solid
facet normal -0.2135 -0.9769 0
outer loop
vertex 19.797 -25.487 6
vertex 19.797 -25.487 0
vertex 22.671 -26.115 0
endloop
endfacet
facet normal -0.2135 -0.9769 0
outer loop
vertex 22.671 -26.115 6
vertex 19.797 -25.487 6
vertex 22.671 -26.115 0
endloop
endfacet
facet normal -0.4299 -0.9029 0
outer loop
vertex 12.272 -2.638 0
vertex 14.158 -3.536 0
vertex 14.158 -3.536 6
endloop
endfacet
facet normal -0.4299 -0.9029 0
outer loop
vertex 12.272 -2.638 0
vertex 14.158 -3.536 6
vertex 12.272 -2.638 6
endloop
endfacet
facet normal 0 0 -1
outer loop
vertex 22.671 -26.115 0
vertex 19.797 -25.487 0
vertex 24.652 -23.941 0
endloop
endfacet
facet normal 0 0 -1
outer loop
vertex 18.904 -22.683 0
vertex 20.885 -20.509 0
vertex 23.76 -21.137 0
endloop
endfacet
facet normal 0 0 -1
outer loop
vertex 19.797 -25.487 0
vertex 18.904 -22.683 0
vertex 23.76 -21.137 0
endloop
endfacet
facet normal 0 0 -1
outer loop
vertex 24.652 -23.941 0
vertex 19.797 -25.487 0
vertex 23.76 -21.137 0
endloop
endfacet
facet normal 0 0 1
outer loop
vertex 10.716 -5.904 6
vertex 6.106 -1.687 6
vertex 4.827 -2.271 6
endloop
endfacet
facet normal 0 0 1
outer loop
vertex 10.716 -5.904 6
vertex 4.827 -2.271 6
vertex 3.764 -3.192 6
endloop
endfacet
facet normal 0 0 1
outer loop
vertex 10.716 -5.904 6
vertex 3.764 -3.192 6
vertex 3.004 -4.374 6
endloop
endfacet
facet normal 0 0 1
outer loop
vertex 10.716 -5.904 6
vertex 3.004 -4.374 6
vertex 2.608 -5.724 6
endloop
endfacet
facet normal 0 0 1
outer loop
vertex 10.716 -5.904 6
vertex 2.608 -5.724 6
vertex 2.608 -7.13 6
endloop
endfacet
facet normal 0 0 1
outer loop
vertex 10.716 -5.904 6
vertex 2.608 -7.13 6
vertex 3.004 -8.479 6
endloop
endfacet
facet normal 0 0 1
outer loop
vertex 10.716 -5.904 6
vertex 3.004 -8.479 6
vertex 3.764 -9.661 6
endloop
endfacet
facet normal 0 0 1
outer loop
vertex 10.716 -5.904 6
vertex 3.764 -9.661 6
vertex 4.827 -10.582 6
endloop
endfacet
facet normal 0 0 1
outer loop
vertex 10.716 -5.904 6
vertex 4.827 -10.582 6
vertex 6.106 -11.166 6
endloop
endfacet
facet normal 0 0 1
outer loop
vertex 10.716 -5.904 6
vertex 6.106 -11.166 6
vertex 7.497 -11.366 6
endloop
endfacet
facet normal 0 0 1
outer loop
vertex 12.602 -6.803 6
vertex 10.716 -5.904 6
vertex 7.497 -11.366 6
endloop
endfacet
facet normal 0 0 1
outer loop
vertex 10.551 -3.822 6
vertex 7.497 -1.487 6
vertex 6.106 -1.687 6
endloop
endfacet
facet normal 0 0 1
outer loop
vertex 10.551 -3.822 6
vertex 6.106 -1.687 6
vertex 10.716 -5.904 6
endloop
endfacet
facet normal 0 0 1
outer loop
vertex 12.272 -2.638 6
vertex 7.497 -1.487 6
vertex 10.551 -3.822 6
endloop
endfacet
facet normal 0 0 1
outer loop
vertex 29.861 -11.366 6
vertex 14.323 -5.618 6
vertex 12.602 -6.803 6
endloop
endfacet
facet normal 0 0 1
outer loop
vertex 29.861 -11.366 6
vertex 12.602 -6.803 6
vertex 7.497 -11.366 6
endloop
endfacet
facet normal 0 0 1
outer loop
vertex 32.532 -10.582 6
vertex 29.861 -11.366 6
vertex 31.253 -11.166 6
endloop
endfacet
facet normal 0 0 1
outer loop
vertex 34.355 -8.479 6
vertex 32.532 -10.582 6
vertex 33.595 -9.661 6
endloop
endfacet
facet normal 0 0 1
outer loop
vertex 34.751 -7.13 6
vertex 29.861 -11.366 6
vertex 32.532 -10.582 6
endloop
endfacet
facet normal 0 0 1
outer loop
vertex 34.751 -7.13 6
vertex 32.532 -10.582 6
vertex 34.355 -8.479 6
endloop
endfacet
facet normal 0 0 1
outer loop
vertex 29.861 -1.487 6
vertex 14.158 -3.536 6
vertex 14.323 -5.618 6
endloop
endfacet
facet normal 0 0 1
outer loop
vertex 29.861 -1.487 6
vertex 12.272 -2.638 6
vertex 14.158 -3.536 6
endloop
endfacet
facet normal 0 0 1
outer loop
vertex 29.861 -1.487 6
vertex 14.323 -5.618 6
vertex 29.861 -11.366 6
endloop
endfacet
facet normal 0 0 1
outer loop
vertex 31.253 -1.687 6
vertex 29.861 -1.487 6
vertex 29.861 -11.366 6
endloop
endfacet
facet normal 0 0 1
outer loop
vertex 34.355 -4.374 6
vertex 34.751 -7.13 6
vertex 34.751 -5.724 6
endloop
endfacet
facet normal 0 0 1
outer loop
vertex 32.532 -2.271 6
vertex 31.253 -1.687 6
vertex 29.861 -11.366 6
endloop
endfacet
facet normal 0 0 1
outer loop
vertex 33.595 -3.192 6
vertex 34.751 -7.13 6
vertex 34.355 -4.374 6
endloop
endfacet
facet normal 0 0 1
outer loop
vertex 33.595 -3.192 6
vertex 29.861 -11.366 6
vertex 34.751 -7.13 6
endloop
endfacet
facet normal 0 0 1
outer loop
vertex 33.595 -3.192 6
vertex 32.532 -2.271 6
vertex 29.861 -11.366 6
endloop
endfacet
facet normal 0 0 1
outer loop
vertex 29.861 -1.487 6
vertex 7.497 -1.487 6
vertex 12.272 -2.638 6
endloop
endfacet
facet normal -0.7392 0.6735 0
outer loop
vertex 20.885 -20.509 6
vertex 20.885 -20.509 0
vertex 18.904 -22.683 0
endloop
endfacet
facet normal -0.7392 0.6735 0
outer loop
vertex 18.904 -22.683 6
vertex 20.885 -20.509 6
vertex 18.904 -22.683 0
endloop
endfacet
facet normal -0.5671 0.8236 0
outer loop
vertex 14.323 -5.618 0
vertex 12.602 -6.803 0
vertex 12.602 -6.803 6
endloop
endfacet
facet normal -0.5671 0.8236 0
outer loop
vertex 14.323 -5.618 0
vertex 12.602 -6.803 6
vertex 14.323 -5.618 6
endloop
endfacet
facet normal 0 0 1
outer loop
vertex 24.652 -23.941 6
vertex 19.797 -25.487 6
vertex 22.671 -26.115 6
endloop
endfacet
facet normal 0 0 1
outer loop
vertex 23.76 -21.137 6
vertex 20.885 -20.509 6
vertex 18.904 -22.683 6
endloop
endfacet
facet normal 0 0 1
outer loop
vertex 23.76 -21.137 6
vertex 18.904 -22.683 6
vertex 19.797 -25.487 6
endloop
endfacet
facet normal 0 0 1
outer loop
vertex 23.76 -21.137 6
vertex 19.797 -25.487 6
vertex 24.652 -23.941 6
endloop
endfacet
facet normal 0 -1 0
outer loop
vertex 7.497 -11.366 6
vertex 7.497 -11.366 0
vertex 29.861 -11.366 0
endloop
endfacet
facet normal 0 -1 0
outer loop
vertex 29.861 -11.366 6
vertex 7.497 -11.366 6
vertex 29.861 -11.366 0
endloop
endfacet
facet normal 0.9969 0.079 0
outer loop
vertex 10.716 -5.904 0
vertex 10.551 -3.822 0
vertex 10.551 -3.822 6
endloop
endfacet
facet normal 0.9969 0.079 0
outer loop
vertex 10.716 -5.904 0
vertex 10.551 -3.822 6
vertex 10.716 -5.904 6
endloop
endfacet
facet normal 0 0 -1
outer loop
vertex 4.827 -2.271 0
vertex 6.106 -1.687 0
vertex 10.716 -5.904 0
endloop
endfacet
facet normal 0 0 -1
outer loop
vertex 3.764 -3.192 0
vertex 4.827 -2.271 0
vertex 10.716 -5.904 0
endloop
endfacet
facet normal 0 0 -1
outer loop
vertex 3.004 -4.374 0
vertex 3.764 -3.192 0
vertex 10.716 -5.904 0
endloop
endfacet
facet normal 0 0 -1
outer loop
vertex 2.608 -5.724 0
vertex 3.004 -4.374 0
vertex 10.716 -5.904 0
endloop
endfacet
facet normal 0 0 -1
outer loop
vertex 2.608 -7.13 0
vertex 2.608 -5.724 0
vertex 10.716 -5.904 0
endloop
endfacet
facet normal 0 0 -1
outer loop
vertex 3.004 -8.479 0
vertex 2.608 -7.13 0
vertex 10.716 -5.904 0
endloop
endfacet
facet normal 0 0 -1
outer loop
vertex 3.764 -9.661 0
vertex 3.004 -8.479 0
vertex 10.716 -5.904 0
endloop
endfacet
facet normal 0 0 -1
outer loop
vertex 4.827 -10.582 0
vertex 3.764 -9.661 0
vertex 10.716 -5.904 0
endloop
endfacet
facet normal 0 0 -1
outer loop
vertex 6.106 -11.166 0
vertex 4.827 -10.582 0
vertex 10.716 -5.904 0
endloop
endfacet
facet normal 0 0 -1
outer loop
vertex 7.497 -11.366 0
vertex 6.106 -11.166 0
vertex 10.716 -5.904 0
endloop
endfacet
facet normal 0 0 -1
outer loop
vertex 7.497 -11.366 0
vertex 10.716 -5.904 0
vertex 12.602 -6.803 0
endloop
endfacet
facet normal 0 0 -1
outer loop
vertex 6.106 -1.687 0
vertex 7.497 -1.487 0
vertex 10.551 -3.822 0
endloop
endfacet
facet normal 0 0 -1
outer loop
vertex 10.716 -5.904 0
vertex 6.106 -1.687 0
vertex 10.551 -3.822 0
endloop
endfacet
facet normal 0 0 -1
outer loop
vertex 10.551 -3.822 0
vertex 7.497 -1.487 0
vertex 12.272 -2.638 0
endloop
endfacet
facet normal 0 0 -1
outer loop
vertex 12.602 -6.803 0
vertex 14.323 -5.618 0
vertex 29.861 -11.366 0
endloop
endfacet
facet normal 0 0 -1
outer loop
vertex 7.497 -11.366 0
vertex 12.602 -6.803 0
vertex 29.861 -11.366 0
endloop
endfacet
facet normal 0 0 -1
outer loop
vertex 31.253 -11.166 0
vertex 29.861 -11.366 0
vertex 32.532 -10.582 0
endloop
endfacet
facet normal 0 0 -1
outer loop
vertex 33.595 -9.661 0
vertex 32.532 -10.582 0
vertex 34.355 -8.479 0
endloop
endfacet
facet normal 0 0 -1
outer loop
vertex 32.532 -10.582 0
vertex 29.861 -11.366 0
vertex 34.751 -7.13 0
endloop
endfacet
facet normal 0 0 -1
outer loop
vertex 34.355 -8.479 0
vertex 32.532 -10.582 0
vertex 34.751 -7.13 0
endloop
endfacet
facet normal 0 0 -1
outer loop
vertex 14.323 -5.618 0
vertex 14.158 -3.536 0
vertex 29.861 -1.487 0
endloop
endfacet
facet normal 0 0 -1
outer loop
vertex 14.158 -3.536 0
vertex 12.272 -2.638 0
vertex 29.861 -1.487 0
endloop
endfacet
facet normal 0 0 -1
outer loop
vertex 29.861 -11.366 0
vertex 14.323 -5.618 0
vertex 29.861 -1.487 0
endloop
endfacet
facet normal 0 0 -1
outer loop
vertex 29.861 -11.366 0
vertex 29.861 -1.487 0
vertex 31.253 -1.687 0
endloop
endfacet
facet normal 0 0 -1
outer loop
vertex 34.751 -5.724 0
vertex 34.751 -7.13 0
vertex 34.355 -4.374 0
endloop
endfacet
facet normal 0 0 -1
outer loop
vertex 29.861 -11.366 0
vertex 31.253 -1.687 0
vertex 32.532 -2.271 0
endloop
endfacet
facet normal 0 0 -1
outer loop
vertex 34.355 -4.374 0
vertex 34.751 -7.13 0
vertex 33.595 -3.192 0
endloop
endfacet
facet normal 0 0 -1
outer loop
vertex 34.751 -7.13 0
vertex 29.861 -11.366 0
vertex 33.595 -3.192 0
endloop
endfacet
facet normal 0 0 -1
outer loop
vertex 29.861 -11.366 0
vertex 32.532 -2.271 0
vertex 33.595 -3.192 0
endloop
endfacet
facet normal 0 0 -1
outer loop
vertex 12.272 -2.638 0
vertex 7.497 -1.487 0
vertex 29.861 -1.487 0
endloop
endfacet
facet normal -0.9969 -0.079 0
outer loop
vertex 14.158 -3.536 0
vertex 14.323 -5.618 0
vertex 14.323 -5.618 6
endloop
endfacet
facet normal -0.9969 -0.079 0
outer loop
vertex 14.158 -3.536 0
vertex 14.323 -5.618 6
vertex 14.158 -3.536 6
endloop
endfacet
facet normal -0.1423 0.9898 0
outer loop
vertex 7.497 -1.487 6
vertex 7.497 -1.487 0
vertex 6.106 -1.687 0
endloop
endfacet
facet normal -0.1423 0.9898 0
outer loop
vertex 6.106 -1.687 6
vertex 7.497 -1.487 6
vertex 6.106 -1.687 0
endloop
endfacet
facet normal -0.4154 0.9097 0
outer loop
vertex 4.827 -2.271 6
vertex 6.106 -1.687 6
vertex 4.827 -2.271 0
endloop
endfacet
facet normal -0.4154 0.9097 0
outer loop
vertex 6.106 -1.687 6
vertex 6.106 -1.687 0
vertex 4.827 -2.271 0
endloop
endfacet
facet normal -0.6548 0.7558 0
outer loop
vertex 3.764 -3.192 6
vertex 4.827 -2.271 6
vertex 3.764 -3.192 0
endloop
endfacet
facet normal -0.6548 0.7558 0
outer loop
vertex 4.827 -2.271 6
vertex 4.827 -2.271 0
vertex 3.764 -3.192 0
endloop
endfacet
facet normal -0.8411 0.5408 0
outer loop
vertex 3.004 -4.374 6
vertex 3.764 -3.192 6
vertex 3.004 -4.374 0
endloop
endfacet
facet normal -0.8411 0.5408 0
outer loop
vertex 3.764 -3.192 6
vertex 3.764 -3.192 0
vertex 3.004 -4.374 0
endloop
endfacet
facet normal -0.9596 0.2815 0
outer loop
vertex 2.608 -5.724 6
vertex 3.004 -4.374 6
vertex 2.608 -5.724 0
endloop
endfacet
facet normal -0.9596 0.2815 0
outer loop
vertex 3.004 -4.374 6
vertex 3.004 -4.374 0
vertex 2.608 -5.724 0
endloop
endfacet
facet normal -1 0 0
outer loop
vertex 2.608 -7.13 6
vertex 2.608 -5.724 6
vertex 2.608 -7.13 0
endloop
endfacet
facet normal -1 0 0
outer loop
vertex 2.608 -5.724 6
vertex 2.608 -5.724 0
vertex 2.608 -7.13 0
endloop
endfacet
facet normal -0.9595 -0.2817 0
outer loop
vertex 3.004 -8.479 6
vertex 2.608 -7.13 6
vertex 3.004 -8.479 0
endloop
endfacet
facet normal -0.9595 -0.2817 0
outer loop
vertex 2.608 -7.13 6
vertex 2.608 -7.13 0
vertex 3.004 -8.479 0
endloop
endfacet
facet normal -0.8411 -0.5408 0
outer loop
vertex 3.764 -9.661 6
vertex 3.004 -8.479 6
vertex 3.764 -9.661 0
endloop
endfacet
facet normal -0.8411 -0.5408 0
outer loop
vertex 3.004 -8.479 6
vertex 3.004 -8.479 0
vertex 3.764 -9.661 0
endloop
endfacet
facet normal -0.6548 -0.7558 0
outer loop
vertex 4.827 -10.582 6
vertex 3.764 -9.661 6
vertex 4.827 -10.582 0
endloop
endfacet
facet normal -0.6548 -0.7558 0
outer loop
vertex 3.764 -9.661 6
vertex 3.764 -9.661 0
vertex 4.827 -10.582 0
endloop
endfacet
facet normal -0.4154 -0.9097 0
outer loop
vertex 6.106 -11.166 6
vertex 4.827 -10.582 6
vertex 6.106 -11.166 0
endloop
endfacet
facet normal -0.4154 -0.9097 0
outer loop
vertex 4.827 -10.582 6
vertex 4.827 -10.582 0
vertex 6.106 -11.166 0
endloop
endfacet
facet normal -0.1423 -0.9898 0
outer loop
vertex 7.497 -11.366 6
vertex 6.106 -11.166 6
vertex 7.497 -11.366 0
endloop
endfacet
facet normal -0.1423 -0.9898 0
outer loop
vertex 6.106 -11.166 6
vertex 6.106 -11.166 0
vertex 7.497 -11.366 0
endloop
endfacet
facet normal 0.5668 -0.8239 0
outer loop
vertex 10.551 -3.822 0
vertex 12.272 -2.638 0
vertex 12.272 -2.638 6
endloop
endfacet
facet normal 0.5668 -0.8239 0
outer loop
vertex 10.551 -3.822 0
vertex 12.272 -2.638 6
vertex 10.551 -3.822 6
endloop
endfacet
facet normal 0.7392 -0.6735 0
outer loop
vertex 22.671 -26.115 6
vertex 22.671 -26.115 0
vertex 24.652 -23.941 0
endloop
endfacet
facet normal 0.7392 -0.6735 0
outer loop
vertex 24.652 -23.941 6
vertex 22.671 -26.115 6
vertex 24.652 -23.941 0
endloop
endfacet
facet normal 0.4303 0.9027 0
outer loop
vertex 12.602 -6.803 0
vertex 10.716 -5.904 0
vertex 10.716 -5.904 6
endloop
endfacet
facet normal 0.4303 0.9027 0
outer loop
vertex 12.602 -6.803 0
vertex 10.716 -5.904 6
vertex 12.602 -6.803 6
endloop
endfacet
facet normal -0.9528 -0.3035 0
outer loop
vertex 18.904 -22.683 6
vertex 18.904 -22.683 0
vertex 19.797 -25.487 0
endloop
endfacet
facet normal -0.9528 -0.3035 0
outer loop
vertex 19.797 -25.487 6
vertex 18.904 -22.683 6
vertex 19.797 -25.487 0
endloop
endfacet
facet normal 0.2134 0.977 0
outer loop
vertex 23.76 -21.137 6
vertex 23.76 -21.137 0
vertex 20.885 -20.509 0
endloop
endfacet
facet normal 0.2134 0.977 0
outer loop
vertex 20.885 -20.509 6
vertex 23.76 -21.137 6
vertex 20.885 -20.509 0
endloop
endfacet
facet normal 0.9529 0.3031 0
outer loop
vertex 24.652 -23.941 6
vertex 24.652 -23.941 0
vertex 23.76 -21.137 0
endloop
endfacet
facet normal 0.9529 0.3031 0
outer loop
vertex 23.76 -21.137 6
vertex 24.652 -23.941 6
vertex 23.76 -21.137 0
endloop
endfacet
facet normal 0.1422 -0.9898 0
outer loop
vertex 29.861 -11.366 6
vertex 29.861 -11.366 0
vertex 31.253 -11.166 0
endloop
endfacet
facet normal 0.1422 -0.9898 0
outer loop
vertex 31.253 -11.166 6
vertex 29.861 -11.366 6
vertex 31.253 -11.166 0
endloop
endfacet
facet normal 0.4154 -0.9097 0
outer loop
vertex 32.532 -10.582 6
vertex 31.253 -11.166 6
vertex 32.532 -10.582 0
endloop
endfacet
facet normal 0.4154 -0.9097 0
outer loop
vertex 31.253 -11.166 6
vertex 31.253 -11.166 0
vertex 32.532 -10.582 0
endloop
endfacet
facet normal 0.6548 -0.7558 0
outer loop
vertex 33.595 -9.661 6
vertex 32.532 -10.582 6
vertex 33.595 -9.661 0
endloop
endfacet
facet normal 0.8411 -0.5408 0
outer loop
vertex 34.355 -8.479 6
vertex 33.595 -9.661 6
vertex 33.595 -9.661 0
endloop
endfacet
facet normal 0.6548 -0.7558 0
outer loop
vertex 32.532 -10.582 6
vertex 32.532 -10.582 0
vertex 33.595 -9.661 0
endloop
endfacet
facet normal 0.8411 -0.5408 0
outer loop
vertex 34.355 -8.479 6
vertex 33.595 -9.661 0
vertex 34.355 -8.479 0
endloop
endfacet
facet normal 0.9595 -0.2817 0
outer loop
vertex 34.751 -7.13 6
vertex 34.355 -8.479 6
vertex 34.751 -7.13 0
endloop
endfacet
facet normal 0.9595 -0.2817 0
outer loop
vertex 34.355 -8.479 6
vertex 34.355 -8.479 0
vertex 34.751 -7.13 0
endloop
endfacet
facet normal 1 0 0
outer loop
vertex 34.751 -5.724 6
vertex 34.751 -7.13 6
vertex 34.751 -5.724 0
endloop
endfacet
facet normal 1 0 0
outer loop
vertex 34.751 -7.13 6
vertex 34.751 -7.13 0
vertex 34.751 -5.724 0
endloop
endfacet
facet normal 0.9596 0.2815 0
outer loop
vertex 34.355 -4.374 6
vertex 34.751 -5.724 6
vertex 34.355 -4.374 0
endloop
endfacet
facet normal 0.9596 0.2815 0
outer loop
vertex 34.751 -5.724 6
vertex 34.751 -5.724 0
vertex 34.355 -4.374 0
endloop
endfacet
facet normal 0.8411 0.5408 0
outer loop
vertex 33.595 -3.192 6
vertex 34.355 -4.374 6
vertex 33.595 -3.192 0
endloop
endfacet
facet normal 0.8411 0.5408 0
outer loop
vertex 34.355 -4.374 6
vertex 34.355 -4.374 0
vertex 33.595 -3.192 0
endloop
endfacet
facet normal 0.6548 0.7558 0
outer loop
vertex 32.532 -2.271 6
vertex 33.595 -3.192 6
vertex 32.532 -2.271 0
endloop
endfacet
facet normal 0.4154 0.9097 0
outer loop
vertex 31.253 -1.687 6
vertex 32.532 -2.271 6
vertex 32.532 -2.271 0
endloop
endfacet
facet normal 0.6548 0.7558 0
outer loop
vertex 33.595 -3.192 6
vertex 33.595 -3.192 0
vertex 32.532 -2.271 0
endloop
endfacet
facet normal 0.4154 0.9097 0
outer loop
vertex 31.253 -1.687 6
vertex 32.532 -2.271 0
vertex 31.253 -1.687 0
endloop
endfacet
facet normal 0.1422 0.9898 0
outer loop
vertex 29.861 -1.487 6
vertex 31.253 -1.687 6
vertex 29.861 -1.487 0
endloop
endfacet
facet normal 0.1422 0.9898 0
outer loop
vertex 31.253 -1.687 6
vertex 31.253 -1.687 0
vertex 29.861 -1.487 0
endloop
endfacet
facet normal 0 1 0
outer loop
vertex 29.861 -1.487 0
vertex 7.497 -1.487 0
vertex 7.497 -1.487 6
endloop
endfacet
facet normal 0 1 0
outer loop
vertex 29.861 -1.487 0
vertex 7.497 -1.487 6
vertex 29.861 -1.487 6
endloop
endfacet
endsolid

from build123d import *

# Parameters (mm, degrees)
EXTRUDE_DEPTH = 6


with BuildPart() as part:
    # Sketch → Extrude (new body)
    with BuildSketch(Plane.XY):
        with BuildLine():
            ThreePointArc((7.49734, -1.486697), (2.557467, -6.42657), (7.49734, -11.366443))
            Line((7.49734, -11.366443), (29.861489, -11.366443))
            ThreePointArc((29.861489, -11.366443), (34.801362, -6.42657), (29.861489, -1.486697))
            Line((7.49734, -1.486697), (29.861489, -1.486697))
        make_face()
        Polygon((14.323343, -5.618229), (14.158107, -3.535713), (12.271977, -2.637554), (10.551083, -3.821911), (10.716319, -5.904427), (12.602449, -6.802586), align=None, mode=Mode.SUBTRACT)
        Polygon((24.652168, -23.940664), (23.759593, -21.137257), (20.885484, -20.508546), (18.90395, -22.683242), (19.796525, -25.486649), (22.670634, -26.11536), align=None)
    extrude(amount=EXTRUDE_DEPTH)


solid = part.part
